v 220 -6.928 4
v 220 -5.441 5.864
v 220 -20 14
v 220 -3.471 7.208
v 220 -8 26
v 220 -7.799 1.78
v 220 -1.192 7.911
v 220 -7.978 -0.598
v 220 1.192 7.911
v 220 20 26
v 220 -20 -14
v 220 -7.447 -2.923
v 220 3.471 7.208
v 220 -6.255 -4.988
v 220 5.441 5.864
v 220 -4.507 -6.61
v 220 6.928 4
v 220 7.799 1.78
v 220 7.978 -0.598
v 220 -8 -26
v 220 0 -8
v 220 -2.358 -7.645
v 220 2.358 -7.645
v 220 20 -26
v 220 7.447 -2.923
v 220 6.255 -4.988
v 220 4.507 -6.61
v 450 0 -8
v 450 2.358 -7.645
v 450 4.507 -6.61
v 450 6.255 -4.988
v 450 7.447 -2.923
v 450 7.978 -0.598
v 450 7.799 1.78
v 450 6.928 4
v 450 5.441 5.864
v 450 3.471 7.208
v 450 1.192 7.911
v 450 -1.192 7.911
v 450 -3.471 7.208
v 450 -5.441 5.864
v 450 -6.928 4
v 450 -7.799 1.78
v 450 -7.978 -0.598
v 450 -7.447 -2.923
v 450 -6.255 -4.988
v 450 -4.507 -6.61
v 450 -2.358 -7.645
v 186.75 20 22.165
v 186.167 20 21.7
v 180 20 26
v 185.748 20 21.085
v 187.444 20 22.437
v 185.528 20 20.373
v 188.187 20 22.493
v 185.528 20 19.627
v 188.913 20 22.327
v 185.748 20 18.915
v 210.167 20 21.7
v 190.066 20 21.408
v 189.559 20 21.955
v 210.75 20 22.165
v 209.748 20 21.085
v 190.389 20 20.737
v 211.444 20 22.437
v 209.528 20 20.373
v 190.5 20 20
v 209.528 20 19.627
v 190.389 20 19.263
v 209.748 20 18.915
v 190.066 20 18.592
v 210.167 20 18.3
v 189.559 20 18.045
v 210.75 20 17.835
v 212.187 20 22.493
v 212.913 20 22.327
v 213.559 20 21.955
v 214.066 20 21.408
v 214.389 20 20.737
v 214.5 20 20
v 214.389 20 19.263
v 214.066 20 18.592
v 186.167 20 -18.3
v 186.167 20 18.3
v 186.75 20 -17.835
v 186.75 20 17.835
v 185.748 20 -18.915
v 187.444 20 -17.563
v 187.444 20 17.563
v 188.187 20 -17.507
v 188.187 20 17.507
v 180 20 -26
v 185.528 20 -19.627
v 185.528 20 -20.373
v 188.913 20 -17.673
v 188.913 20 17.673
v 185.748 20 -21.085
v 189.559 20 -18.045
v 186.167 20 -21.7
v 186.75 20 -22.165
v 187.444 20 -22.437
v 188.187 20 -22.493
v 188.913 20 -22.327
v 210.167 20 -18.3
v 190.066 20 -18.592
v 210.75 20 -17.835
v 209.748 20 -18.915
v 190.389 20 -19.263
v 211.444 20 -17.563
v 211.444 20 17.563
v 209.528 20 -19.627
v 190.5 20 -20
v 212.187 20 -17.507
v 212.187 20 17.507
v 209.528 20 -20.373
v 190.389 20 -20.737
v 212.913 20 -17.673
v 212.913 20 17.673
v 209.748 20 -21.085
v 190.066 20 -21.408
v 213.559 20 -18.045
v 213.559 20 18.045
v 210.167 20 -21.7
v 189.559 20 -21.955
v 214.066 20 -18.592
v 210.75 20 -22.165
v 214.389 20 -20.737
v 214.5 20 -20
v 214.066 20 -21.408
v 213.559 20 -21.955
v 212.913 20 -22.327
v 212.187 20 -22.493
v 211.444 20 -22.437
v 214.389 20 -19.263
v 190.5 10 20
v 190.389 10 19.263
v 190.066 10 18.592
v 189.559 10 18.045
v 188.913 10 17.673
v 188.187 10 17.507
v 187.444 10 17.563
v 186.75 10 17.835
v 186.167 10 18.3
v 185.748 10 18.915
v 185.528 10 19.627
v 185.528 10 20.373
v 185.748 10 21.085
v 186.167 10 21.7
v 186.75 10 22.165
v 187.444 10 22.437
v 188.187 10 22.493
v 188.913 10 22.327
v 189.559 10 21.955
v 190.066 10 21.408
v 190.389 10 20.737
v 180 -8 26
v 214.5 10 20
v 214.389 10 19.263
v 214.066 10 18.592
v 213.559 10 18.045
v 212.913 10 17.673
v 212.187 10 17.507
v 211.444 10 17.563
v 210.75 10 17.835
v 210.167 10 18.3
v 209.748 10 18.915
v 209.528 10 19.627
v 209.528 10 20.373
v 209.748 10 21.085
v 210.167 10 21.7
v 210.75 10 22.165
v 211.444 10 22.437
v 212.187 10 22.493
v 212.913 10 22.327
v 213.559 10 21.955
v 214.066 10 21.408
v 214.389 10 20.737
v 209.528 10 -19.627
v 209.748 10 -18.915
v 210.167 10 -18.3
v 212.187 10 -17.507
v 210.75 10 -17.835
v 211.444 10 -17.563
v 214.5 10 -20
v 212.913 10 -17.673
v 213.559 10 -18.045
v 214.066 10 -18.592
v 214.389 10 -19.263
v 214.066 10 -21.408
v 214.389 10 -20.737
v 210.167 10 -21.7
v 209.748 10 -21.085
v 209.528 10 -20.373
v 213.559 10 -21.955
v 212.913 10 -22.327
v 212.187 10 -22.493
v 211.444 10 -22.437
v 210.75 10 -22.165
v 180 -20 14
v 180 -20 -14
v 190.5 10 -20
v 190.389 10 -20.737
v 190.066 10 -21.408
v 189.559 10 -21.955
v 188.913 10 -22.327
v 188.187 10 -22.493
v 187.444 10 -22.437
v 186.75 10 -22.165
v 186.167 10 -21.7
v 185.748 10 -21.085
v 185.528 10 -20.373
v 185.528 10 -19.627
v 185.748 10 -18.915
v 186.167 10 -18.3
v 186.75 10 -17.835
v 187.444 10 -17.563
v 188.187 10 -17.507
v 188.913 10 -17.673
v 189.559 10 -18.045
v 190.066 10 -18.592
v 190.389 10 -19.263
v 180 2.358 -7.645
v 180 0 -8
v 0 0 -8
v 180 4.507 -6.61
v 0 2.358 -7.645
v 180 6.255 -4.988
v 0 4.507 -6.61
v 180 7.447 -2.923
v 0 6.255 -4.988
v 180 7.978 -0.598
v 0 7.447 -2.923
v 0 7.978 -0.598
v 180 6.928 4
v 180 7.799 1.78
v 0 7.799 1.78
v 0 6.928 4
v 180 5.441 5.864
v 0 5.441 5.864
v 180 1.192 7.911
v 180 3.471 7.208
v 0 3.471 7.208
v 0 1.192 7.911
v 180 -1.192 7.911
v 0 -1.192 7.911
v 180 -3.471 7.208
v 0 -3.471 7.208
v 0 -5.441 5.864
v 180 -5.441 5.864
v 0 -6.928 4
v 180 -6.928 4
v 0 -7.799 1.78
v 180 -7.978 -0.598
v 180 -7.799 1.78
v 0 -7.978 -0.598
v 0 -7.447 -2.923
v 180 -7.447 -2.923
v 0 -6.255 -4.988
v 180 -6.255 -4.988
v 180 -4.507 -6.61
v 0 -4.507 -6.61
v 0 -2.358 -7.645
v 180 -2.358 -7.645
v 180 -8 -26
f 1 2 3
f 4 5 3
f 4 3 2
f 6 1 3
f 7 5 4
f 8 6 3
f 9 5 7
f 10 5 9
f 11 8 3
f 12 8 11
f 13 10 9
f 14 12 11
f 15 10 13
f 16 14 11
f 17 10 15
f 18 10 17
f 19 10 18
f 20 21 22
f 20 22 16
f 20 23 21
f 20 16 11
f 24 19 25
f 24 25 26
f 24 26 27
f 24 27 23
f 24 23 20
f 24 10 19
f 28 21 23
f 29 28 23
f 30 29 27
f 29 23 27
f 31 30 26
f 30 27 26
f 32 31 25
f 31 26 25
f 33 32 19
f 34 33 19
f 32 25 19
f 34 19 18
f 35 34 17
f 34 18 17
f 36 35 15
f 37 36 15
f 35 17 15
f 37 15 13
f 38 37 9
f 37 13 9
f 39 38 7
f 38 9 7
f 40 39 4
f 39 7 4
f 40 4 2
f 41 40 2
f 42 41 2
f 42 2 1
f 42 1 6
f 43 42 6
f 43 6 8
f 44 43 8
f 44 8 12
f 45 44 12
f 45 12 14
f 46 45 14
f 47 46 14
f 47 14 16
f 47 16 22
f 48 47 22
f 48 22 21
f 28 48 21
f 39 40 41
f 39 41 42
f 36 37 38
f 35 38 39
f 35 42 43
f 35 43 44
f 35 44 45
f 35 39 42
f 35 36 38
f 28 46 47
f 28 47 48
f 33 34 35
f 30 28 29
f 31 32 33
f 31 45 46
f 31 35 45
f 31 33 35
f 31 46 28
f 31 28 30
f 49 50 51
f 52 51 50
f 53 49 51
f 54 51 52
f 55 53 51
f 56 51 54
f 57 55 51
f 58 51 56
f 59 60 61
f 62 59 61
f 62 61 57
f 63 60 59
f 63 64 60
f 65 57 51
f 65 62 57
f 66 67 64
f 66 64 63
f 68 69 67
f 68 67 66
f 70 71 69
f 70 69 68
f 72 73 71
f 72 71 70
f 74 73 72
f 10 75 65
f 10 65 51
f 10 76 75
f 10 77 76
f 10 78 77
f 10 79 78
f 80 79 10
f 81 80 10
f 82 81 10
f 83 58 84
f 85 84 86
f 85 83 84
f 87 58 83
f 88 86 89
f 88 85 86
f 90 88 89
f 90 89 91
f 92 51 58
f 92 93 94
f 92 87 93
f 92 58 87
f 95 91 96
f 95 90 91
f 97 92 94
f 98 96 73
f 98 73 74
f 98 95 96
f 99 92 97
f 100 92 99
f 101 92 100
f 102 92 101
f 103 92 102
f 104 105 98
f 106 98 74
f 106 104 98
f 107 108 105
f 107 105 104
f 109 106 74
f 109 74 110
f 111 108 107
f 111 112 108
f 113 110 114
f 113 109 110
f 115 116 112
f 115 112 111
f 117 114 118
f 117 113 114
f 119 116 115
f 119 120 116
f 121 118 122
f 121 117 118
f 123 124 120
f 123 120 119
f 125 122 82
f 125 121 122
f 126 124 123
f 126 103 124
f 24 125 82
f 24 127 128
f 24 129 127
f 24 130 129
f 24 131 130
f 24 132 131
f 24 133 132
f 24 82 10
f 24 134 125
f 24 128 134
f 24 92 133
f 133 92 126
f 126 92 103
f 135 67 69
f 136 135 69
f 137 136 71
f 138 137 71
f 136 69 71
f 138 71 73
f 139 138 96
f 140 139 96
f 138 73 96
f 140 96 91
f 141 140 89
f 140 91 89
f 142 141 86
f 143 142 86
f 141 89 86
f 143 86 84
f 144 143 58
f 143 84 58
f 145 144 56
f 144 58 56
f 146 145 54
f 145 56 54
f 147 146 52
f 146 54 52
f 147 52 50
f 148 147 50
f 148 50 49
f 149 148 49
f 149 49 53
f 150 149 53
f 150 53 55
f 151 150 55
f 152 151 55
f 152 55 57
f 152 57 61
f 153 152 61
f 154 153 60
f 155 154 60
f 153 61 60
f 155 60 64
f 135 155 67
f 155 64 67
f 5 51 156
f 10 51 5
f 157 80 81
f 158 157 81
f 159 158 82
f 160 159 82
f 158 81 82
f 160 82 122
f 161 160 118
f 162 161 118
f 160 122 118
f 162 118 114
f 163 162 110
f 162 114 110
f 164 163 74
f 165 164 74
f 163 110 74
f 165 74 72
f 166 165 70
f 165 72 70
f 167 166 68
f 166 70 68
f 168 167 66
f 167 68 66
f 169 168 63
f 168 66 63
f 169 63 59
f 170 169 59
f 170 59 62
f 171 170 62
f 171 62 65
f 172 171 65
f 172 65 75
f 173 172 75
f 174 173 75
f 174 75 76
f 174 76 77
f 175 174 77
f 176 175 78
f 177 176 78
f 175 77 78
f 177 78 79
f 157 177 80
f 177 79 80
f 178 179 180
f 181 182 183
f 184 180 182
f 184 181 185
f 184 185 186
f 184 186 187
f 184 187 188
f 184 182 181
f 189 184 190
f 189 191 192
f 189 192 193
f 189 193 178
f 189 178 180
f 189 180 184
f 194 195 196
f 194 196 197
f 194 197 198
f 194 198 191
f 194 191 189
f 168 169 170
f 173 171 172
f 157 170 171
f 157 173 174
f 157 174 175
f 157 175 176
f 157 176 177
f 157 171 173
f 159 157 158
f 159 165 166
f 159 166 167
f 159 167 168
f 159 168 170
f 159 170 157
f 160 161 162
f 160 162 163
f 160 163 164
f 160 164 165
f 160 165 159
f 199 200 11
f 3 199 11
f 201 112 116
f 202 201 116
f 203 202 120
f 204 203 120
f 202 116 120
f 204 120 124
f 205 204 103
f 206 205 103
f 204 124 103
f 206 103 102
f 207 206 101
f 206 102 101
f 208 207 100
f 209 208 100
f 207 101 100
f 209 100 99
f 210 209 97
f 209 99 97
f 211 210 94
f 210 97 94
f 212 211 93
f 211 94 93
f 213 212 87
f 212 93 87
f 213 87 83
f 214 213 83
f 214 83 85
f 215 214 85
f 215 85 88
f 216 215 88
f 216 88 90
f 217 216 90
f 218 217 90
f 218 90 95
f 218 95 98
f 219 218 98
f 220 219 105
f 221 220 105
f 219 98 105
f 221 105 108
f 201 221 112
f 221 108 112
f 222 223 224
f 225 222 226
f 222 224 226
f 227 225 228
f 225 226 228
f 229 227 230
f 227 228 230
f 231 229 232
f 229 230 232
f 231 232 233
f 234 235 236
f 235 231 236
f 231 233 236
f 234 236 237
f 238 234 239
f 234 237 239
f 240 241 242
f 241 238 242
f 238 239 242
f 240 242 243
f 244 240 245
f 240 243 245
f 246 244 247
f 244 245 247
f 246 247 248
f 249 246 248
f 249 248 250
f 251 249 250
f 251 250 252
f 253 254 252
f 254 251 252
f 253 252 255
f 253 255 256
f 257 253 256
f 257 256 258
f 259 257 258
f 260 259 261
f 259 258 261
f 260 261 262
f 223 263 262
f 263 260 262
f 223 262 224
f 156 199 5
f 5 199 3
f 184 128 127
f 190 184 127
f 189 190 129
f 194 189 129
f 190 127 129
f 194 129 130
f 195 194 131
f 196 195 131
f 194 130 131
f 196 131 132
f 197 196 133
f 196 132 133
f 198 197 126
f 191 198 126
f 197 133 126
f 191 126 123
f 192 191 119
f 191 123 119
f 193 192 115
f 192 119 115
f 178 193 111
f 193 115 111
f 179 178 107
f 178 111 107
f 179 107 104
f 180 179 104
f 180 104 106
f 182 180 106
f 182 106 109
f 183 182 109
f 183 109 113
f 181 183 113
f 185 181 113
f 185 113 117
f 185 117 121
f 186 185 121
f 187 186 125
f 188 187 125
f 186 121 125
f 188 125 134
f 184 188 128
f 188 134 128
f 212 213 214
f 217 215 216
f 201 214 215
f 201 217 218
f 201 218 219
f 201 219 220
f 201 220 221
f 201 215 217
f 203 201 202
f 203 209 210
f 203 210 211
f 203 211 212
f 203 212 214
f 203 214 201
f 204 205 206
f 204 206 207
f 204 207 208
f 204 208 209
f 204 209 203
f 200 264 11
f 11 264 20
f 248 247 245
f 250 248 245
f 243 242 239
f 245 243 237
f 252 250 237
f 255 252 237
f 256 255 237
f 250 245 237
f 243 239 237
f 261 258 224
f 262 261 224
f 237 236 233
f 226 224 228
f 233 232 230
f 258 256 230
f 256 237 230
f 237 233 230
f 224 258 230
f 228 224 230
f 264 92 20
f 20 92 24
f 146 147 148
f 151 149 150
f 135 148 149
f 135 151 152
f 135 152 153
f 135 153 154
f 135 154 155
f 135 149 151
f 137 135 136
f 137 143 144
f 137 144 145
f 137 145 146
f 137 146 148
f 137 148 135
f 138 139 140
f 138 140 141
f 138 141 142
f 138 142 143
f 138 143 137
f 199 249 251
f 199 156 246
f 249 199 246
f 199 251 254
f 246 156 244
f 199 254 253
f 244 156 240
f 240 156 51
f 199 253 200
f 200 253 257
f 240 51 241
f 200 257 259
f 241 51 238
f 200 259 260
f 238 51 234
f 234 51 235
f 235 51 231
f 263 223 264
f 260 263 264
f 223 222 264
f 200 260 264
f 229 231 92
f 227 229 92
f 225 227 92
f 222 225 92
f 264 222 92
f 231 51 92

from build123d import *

# Parameters (mm, degrees)
SKETCH1_R           = 8
BOSS_EXTRUDE1_DEPTH = 450
SKETCH2_W           = 40
SKETCH2_H           = 52
BOSS_EXTRUDE2_DEPTH = 20
CHAMFER1_SIZE       = 12
SKETCH3_R           = 2.5
CUT_EXTRUDE1_DEPTH  = 10


with BuildPart() as part:
    # Sketch1 → Boss-Extrude1 (new body)
    with BuildSketch(Plane(origin=(0, 0, 0), x_dir=(0, 0, -1), z_dir=(1, 0, 0))):
        Circle(SKETCH1_R)
    extrude(amount=BOSS_EXTRUDE1_DEPTH)

    # Sketch2 → Boss-Extrude2 (add, symmetric)
    with BuildSketch(Plane(origin=(0, 0, 0), x_dir=(1, 0, 0), z_dir=(0, 1, 0))):
        with Locations((200, 0)):
            Rectangle(SKETCH2_W, SKETCH2_H)
    extrude(amount=BOSS_EXTRUDE2_DEPTH, both=True)

    # Chamfer1
    chamfer1_edges = [part.edges().sort_by_distance(p)[0] for p in [
        (200, -20, 26),
        (200, -20, -26),
    ]]
    chamfer(chamfer1_edges, length=CHAMFER1_SIZE)

    # Sketch3 → Cut-Extrude1 (cut)
    with BuildSketch(Plane(origin=(0, 20, 0), x_dir=(1, 0, 0), z_dir=(0, 1, 0))):
        with Locations((188, 20)):
            Circle(SKETCH3_R)
        with Locations((212, 20)):
            Circle(SKETCH3_R)
        with Locations((188, -20)):
            Circle(SKETCH3_R)
        with Locations((212, -20)):
            Circle(SKETCH3_R)
    extrude(amount=-CUT_EXTRUDE1_DEPTH, mode=Mode.SUBTRACT)


solid = part.part
